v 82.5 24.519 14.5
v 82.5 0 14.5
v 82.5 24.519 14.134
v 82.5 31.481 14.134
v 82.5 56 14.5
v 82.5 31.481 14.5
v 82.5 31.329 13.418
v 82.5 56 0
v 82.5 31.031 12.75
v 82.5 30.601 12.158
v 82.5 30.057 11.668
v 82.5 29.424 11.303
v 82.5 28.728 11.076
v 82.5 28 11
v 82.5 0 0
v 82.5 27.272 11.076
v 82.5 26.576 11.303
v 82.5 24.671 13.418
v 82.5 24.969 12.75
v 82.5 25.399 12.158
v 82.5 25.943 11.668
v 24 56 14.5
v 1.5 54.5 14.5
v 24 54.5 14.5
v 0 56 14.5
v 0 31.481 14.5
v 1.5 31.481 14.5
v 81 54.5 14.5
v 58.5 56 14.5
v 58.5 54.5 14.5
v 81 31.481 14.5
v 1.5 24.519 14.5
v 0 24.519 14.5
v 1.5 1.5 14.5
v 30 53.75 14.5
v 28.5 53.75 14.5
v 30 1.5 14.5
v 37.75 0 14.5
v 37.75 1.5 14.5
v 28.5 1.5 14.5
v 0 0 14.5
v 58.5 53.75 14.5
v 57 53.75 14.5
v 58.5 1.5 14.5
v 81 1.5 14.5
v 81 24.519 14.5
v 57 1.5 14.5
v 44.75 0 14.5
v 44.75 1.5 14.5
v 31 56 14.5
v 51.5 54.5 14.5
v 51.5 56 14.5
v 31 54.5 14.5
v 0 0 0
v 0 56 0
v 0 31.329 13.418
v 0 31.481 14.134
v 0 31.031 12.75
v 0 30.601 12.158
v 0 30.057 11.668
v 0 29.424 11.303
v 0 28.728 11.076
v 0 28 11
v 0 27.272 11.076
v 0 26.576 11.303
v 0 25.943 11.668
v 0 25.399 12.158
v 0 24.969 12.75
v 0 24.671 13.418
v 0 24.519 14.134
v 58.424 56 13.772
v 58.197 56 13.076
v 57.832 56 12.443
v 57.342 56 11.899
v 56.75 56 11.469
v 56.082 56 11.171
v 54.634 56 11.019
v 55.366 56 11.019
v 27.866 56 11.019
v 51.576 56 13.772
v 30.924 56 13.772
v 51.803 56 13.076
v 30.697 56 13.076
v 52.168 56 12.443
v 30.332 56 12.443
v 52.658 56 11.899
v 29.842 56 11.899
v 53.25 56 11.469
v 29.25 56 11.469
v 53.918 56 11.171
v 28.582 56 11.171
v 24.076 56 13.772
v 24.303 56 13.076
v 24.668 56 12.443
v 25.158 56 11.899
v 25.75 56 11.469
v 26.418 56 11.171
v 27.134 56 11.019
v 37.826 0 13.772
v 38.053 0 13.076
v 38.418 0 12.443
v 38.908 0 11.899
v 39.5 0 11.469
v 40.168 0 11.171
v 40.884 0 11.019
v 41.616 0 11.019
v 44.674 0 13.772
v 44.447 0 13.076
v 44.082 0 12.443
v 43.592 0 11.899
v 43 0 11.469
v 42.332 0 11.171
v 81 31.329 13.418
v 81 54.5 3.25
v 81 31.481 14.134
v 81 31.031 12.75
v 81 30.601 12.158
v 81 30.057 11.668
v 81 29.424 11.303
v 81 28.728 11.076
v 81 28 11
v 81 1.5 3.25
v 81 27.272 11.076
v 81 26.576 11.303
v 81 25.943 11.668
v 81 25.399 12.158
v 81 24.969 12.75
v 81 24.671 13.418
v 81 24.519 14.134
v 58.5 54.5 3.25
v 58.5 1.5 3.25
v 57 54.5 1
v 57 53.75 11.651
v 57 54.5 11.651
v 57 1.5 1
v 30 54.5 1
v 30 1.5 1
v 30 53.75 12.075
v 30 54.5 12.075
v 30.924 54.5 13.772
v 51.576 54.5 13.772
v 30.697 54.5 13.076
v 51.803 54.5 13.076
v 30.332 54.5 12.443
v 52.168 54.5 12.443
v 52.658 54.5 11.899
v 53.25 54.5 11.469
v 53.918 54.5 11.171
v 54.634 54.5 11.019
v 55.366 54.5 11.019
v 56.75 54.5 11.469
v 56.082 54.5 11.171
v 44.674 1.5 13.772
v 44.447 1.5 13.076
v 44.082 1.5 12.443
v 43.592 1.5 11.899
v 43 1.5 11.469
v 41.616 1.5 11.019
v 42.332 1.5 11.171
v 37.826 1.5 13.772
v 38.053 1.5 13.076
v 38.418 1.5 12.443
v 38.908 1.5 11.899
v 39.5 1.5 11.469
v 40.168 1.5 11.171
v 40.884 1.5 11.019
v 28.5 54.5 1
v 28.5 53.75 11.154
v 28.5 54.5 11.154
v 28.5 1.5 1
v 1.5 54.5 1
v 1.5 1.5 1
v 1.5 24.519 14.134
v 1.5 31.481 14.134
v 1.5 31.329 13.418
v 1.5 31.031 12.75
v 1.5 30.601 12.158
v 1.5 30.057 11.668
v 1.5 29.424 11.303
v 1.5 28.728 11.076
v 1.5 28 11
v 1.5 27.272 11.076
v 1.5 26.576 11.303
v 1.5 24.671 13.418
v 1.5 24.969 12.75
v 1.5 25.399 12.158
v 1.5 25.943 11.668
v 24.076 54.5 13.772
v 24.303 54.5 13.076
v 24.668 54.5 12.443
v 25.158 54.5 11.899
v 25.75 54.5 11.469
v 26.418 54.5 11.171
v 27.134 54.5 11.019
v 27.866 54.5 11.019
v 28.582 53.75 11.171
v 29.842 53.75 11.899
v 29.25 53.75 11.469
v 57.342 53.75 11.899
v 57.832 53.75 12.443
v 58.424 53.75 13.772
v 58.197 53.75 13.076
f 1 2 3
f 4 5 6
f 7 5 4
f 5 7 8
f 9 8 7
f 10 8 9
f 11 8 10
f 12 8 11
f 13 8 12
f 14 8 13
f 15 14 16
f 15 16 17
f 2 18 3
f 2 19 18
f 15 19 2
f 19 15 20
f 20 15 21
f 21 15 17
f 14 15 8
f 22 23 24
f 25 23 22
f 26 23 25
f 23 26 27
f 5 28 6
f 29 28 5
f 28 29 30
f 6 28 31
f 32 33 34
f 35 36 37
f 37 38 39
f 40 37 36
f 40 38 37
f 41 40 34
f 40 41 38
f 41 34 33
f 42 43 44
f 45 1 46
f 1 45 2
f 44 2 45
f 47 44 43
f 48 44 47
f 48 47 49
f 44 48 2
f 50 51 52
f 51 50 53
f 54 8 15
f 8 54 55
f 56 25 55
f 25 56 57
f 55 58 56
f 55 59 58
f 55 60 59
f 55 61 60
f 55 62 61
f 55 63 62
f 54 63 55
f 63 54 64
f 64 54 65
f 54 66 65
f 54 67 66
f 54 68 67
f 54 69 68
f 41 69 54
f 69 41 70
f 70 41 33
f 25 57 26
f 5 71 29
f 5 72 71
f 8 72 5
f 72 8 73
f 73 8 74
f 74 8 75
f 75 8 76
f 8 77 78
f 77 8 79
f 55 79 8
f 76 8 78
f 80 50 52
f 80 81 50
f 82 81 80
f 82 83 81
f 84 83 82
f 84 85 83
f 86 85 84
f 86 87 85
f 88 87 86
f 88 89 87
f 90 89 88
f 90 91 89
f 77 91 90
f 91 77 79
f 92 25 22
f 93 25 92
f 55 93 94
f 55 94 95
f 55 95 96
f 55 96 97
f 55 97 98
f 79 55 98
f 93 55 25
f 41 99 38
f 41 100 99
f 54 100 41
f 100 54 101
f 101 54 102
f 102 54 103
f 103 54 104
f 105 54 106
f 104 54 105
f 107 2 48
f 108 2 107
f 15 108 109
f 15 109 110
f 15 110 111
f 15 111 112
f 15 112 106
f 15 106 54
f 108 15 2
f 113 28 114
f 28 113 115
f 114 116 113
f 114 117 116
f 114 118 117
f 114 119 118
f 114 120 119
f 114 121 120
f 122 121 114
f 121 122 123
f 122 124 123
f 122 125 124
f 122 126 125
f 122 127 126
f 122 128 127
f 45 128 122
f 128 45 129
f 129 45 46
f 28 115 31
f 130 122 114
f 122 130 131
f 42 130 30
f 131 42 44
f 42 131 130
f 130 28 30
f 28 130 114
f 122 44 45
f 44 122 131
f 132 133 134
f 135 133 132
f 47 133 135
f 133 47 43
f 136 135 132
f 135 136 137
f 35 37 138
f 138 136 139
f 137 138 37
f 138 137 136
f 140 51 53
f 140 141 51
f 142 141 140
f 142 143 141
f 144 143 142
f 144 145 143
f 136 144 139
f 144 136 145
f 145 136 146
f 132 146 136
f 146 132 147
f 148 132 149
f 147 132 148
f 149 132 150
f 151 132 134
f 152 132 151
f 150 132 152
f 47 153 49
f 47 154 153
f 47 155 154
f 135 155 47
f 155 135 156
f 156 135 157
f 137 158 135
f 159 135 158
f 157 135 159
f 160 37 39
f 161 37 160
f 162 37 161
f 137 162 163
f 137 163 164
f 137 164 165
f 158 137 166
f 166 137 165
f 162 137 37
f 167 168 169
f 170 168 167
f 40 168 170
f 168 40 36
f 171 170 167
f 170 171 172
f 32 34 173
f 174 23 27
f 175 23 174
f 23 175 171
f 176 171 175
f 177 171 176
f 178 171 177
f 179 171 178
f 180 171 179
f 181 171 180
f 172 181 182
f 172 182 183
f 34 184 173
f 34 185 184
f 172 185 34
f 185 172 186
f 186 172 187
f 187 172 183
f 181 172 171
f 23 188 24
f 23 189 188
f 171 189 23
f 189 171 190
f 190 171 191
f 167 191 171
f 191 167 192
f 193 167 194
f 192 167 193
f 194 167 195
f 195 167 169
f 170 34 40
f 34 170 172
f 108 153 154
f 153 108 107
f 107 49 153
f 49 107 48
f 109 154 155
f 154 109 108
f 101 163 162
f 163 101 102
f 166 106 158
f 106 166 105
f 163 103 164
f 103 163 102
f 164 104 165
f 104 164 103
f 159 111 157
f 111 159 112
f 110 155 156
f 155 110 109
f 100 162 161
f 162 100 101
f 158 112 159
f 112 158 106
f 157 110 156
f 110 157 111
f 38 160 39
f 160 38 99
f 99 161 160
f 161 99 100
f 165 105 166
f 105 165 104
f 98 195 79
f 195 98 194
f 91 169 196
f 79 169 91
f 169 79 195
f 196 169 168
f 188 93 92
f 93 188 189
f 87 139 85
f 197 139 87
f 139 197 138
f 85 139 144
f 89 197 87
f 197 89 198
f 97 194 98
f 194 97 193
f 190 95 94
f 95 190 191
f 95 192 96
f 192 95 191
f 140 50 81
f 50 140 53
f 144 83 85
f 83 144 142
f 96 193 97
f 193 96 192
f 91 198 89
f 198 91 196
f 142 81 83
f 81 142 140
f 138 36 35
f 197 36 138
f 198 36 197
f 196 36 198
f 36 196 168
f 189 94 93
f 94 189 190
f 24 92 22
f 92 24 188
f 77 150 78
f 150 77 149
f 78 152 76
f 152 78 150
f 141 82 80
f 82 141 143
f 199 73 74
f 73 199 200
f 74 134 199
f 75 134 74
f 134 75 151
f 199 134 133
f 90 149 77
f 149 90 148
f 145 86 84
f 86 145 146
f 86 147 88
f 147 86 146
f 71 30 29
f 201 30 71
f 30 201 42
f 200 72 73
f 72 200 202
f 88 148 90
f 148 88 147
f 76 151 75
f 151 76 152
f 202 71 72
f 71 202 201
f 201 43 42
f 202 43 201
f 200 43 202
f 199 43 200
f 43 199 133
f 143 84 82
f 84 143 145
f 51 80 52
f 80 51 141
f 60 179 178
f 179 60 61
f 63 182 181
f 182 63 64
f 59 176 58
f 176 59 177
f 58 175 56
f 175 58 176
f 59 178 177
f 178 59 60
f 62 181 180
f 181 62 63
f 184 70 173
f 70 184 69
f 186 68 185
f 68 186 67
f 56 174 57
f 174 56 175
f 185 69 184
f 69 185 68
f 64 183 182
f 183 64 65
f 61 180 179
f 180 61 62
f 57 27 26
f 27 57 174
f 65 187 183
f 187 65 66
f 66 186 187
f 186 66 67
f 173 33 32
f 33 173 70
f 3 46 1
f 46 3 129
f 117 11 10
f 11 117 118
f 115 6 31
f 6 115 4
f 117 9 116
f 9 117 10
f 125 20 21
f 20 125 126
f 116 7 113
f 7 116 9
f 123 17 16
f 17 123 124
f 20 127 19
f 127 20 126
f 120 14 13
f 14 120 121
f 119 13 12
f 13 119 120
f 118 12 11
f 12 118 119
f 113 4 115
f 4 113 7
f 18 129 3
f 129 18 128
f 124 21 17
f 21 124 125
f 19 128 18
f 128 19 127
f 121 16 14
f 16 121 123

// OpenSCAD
// file: consts.scad
$fs = 0.5;

FLOOR = 1;
WALL = 1.5;
THIN_WALL = 0.6;

SQUARE_TILE = 27; // 25.46mm
TILE_THICK = 3; // 2.18

RESOURCE_TOKEN_STACK = 53; // 51.43mm, 32 tokens

RESOURCE_CARD_W = 46; // 44.05
RESOURCE_CARD_H = 70; // 68.03
RESOURCE_CARD_STACK = 4; // 2.5mm

ACHIEVEMENT_STACK = 6; // 4.72mm

FIRST_PLAYER_H = 31; // 29.12mm
FIRST_PLAYER_W = 27; // 25.19mm
FIRST_PLAYER_D = 11.5; // 9.94mm


CUBE = 9; // 8.6mm

VOTING_TRIANGLE = 29; // 27.44mm
VOTING_STACK = 28; // 26.17, 12 tokens

// Discs
CLAIM_DIA = 13; // 11.83
CLAIM_H = 4; //3.78
CLAIM_STACK = 58; // 55.58

// TOKEN_STACK = 21; // 19.56, 9 tokens
TOKEN_STACK = 14; // 13.02, 6 square tokens

// Cubes
DELIVERY_STACK_D = 58; //55.71
DELIVERY_STACK_W = 18; //16.30
DELIVERY_STACK_H = DELIVERY_STACK_W;

MEEPLE_W = 17; //16.30
MEEPLE_H = 21; //20.23
MEEPLE_STACK = 30.5; //29.01

MONEY_1_DIA = 22.5; //21.22
MONEY_1_STACK = 51; // 49.60
MONEY_3_DIA = 27; //25.64
MONEY_3_STACK = 25.6; //23.97

ROAD_STACK = 53; //51.43

TOKEN_BOX_W = DELIVERY_STACK_W + MEEPLE_W + CLAIM_DIA + WALL * 4;
TOKEN_BOX_D = max(DELIVERY_STACK_D, SQUARE_TILE + WALL + MEEPLE_STACK, CLAIM_STACK) + WALL*2;
TOKEN_BOX_H = DELIVERY_STACK_H + FLOOR - CUBE/2;
TOKEN_BOX_LID_H = FLOOR*2 + SQUARE_TILE - TOKEN_BOX_H;

// Keep the Influence Tokens box the same size to allow stacking
INFLUENCE_BOX_W = TOKEN_BOX_W;
INFLUENCE_BOX_D = TOKEN_BOX_D;
INFLUENCE_BOX_H = (TOKEN_BOX_H + TOKEN_BOX_LID_H + FLOOR)/2;

BANK_BOX_W = MONEY_1_DIA + MONEY_3_DIA + SQUARE_TILE + WALL*4;
BANK_BOX_D = max(MONEY_1_STACK, MONEY_3_STACK, ROAD_STACK) + WALL*2;
BANK_BOX_H = max(MONEY_1_DIA, MONEY_3_DIA, SQUARE_TILE)/2 + FLOOR;

CARD_W = 65; // 63.42
CARD_H = 91; // 89.37

CARD_STACK_INCOME = 1.5; // 0.62, 2 cards
CARD_STACK_ACTION = 2.5; // 1.54, 5 cards, 4 stacks of these
CARD_STACK_ADVISOR = 6.5; // 5.55, 18 cards
CARD_STACK_BUILDING = 7.5; // 6.52, 21 cards

CARD_BOX_W = WALL*2 + CARD_H;
CARD_BOX_D = TOKEN_BOX_W; // These should match for putting in the box
//CARD_BOX_D = WALL*3 + THIN_WALL*6 + CARD_STACK_INCOME + CARD_STACK_ACTION*4 + CARD_STACK_ADVISOR + CARD_STACK_BUILDING + VOTING_STACK/2;
CARD_BOX_H = CARD_W/2 + FLOOR;
CARD_BOX_SPACING = (CARD_BOX_D - CARD_STACK_INCOME - CARD_STACK_ACTION*4 - CARD_STACK_ADVISOR - CARD_STACK_BUILDING - VOTING_STACK/2)/9;

CARD_BOX_LID_W = CARD_BOX_W;
CARD_BOX_LID_D = WALL + VOTING_STACK/2 + THIN_WALL;
CARD_BOX_LID_H = SQUARE_TILE/2 + FLOOR;
VOTING_GAP = (CARD_BOX_W - VOTING_TRIANGLE*2)/3;

CLIP_DIA = 7;

RESOURCE_BOX_W = RESOURCE_CARD_H + WALL*2;
RESOURCE_BOX_D = RESOURCE_CARD_STACK + ACHIEVEMENT_STACK + SQUARE_TILE + WALL*3 + THIN_WALL*1;
RESOURCE_BOX_H = RESOURCE_CARD_W/2 + FLOOR;

// *** Resource Buildings ***

R_STACK = 8; // 6.45, 3 cards
R_STACK_2 = 6; // 4.40
R_STACK_4 = 10; // 8.75

R_1 = 27;
R_2 = 52;
R_3 = 78;
R_4 = 103;
//TIER3_FULL_STACK = 25.89
R_WEAPONS_W_SQ = R_4; //101.60
R_WEAPONS_H_SQ = R_1; //25.72
R_WEAPONS_ANG = 75; // Figured out using brute force, brain melted figuring out formula
R_WEAPONS_W = R_WEAPONS_H_SQ*cos(R_WEAPONS_ANG) + R_WEAPONS_W_SQ*sin(R_WEAPONS_ANG);
R_WEAPONS_H = R_WEAPONS_W_SQ*cos(R_WEAPONS_ANG) + R_WEAPONS_H_SQ*sin(R_WEAPONS_ANG);

R_CLOTH_W = R_2; // 50.77
R_CLOTH_H = R_2;

R_GOV_W = R_3; // 76.40
R_GOV_H = R_2; // 50.95

R_LABOR_W = R_3; // 76.34
R_LABOR_H = R_2; // 50.91

TIER3_W = R_WEAPONS_W + WALL*2;
TIER3_H = R_1 + FLOOR + WALL; // Add in WALL to ensure there is a small lip for the top "row"
TIER3_D = R_STACK*4 + WALL*2 + THIN_WALL*3;

R_BRICK_W = R_3;
R_BRICK_H = R_1;

R_FOOD_W = R_2;
R_FOOD_H = R_2;

R_BOOKS_W = R_3;
R_BOOKS_H = R_1;

R_MACH_W = R_2;
R_MACH_H = R_2;

R_LEATHER_W = R_3;
R_LEATHER_H = R_1;

R_JEWELRY_W = R_2;
R_JEWELRY_H = R_2;

R_3x1_ANG = 70;
R_3x1_W = R_1*cos(R_3x1_ANG) + R_3*sin(R_3x1_ANG);
R_3x1_H = R_3*cos(R_3x1_ANG) + R_1*sin(R_3x1_ANG);

TIER2_W = R_3x1_W + WALL*2;
TIER2_H = TIER3_H;
TIER2_D = R_STACK*6 + WALL*2 + THIN_WALL*5;

R_PREST_1x2_W = R_1;
R_PREST_1x2_H = R_2;
R_PREST_1x2_STACK = R_STACK_2;

R_PREST_1x3_W = R_3;
R_PREST_1x3_H = R_1;
R_PREST_1x3_STACK = R_STACK_4;

R_PREST_L_W = R_2;
R_PREST_L_H = R_2;
R_PREST_L_STACK = R_STACK_2;

R_PREST_T_W = R_3;
R_PREST_T_H = R_2;
R_PREST_T_STACK = R_STACK_2;

R_PREST_Z_W = R_3;
R_PREST_Z_H = R_2;
R_PREST_Z_STACK = R_STACK_2;

R_PREST_LL_W = R_3;
R_PREST_LL_H = R_2;
R_PREST_LL_STACK = R_STACK_2;

R_PREST_2x2_W = R_2;
R_PREST_2x2_H = R_2;
R_PREST_2x2_STACK = R_STACK_2;

R_PREST_ODD_W = R_3;
R_PREST_ODD_H = R_2;
R_PREST_ODD_STACK = R_STACK;

COMPLETION_MARKER_W = 22; // 20.03
COMPLETION_MARKER_H = 17; // 15.93
COMPLETION_MARKER_D = 11; // 9.87

PRESTIGE_W = R_PREST_L_W + R_PREST_1x2_W + THIN_WALL + WALL*2;
PRESTIGE_D = R_PREST_ODD_STACK + R_PREST_2x2_STACK+ R_PREST_LL_STACK+ R_PREST_Z_STACK+ R_PREST_T_STACK+ R_PREST_L_STACK+ R_PREST_1x3_STACK+ COMPLETION_MARKER_W + WALL*3 + THIN_WALL * 6;
PRESTIGE_H = R_1 + FLOOR + WALL; // Add in WALL to ensure there is a small lip for the top "row"
// main file
include <consts.scad>;


INTERNAL_LEN = BANK_BOX_D - WALL*2;

difference() {
    cube([BANK_BOX_W, BANK_BOX_D, BANK_BOX_H]);

    translate([WALL*3 + MONEY_3_DIA + SQUARE_TILE, WALL, BANK_BOX_H - MONEY_1_DIA/2]) cube([MONEY_1_DIA, INTERNAL_LEN, MONEY_1_DIA]);
    translate([WALL*2 + MONEY_3_DIA, WALL, BANK_BOX_H - SQUARE_TILE/2]) cube([SQUARE_TILE, INTERNAL_LEN, SQUARE_TILE]);
    translate([WALL, WALL, BANK_BOX_H - MONEY_3_DIA/2]) cube([MONEY_3_DIA, INTERNAL_LEN, MONEY_3_DIA]);
    translate([WALL + MONEY_3_DIA/2, WALL, BANK_BOX_H]) rotate([-90, 00, 0]) cylinder(d=MONEY_3_DIA, h=INTERNAL_LEN);

    translate([BANK_BOX_W/2, 0, BANK_BOX_H]) rotate([-90, 0, 0]) cylinder(d=CLIP_DIA, h=WALL*1.5);
    translate([BANK_BOX_W/3, BANK_BOX_D, BANK_BOX_H]) rotate([90, 0, 0]) cylinder(d=CLIP_DIA, h=WALL*1.5);
    translate([BANK_BOX_W/3*2, BANK_BOX_D, BANK_BOX_H]) rotate([90, 0, 0]) cylinder(d=CLIP_DIA, h=WALL*1.5);
    translate([0, BANK_BOX_D/2, BANK_BOX_H]) rotate([0, 90, 0]) cylinder(d=CLIP_DIA, h=WALL*1.5);
    translate([BANK_BOX_W, BANK_BOX_D/2, BANK_BOX_H]) rotate([0, -90, 0]) cylinder(d=CLIP_DIA, h=WALL*1.5);
}
